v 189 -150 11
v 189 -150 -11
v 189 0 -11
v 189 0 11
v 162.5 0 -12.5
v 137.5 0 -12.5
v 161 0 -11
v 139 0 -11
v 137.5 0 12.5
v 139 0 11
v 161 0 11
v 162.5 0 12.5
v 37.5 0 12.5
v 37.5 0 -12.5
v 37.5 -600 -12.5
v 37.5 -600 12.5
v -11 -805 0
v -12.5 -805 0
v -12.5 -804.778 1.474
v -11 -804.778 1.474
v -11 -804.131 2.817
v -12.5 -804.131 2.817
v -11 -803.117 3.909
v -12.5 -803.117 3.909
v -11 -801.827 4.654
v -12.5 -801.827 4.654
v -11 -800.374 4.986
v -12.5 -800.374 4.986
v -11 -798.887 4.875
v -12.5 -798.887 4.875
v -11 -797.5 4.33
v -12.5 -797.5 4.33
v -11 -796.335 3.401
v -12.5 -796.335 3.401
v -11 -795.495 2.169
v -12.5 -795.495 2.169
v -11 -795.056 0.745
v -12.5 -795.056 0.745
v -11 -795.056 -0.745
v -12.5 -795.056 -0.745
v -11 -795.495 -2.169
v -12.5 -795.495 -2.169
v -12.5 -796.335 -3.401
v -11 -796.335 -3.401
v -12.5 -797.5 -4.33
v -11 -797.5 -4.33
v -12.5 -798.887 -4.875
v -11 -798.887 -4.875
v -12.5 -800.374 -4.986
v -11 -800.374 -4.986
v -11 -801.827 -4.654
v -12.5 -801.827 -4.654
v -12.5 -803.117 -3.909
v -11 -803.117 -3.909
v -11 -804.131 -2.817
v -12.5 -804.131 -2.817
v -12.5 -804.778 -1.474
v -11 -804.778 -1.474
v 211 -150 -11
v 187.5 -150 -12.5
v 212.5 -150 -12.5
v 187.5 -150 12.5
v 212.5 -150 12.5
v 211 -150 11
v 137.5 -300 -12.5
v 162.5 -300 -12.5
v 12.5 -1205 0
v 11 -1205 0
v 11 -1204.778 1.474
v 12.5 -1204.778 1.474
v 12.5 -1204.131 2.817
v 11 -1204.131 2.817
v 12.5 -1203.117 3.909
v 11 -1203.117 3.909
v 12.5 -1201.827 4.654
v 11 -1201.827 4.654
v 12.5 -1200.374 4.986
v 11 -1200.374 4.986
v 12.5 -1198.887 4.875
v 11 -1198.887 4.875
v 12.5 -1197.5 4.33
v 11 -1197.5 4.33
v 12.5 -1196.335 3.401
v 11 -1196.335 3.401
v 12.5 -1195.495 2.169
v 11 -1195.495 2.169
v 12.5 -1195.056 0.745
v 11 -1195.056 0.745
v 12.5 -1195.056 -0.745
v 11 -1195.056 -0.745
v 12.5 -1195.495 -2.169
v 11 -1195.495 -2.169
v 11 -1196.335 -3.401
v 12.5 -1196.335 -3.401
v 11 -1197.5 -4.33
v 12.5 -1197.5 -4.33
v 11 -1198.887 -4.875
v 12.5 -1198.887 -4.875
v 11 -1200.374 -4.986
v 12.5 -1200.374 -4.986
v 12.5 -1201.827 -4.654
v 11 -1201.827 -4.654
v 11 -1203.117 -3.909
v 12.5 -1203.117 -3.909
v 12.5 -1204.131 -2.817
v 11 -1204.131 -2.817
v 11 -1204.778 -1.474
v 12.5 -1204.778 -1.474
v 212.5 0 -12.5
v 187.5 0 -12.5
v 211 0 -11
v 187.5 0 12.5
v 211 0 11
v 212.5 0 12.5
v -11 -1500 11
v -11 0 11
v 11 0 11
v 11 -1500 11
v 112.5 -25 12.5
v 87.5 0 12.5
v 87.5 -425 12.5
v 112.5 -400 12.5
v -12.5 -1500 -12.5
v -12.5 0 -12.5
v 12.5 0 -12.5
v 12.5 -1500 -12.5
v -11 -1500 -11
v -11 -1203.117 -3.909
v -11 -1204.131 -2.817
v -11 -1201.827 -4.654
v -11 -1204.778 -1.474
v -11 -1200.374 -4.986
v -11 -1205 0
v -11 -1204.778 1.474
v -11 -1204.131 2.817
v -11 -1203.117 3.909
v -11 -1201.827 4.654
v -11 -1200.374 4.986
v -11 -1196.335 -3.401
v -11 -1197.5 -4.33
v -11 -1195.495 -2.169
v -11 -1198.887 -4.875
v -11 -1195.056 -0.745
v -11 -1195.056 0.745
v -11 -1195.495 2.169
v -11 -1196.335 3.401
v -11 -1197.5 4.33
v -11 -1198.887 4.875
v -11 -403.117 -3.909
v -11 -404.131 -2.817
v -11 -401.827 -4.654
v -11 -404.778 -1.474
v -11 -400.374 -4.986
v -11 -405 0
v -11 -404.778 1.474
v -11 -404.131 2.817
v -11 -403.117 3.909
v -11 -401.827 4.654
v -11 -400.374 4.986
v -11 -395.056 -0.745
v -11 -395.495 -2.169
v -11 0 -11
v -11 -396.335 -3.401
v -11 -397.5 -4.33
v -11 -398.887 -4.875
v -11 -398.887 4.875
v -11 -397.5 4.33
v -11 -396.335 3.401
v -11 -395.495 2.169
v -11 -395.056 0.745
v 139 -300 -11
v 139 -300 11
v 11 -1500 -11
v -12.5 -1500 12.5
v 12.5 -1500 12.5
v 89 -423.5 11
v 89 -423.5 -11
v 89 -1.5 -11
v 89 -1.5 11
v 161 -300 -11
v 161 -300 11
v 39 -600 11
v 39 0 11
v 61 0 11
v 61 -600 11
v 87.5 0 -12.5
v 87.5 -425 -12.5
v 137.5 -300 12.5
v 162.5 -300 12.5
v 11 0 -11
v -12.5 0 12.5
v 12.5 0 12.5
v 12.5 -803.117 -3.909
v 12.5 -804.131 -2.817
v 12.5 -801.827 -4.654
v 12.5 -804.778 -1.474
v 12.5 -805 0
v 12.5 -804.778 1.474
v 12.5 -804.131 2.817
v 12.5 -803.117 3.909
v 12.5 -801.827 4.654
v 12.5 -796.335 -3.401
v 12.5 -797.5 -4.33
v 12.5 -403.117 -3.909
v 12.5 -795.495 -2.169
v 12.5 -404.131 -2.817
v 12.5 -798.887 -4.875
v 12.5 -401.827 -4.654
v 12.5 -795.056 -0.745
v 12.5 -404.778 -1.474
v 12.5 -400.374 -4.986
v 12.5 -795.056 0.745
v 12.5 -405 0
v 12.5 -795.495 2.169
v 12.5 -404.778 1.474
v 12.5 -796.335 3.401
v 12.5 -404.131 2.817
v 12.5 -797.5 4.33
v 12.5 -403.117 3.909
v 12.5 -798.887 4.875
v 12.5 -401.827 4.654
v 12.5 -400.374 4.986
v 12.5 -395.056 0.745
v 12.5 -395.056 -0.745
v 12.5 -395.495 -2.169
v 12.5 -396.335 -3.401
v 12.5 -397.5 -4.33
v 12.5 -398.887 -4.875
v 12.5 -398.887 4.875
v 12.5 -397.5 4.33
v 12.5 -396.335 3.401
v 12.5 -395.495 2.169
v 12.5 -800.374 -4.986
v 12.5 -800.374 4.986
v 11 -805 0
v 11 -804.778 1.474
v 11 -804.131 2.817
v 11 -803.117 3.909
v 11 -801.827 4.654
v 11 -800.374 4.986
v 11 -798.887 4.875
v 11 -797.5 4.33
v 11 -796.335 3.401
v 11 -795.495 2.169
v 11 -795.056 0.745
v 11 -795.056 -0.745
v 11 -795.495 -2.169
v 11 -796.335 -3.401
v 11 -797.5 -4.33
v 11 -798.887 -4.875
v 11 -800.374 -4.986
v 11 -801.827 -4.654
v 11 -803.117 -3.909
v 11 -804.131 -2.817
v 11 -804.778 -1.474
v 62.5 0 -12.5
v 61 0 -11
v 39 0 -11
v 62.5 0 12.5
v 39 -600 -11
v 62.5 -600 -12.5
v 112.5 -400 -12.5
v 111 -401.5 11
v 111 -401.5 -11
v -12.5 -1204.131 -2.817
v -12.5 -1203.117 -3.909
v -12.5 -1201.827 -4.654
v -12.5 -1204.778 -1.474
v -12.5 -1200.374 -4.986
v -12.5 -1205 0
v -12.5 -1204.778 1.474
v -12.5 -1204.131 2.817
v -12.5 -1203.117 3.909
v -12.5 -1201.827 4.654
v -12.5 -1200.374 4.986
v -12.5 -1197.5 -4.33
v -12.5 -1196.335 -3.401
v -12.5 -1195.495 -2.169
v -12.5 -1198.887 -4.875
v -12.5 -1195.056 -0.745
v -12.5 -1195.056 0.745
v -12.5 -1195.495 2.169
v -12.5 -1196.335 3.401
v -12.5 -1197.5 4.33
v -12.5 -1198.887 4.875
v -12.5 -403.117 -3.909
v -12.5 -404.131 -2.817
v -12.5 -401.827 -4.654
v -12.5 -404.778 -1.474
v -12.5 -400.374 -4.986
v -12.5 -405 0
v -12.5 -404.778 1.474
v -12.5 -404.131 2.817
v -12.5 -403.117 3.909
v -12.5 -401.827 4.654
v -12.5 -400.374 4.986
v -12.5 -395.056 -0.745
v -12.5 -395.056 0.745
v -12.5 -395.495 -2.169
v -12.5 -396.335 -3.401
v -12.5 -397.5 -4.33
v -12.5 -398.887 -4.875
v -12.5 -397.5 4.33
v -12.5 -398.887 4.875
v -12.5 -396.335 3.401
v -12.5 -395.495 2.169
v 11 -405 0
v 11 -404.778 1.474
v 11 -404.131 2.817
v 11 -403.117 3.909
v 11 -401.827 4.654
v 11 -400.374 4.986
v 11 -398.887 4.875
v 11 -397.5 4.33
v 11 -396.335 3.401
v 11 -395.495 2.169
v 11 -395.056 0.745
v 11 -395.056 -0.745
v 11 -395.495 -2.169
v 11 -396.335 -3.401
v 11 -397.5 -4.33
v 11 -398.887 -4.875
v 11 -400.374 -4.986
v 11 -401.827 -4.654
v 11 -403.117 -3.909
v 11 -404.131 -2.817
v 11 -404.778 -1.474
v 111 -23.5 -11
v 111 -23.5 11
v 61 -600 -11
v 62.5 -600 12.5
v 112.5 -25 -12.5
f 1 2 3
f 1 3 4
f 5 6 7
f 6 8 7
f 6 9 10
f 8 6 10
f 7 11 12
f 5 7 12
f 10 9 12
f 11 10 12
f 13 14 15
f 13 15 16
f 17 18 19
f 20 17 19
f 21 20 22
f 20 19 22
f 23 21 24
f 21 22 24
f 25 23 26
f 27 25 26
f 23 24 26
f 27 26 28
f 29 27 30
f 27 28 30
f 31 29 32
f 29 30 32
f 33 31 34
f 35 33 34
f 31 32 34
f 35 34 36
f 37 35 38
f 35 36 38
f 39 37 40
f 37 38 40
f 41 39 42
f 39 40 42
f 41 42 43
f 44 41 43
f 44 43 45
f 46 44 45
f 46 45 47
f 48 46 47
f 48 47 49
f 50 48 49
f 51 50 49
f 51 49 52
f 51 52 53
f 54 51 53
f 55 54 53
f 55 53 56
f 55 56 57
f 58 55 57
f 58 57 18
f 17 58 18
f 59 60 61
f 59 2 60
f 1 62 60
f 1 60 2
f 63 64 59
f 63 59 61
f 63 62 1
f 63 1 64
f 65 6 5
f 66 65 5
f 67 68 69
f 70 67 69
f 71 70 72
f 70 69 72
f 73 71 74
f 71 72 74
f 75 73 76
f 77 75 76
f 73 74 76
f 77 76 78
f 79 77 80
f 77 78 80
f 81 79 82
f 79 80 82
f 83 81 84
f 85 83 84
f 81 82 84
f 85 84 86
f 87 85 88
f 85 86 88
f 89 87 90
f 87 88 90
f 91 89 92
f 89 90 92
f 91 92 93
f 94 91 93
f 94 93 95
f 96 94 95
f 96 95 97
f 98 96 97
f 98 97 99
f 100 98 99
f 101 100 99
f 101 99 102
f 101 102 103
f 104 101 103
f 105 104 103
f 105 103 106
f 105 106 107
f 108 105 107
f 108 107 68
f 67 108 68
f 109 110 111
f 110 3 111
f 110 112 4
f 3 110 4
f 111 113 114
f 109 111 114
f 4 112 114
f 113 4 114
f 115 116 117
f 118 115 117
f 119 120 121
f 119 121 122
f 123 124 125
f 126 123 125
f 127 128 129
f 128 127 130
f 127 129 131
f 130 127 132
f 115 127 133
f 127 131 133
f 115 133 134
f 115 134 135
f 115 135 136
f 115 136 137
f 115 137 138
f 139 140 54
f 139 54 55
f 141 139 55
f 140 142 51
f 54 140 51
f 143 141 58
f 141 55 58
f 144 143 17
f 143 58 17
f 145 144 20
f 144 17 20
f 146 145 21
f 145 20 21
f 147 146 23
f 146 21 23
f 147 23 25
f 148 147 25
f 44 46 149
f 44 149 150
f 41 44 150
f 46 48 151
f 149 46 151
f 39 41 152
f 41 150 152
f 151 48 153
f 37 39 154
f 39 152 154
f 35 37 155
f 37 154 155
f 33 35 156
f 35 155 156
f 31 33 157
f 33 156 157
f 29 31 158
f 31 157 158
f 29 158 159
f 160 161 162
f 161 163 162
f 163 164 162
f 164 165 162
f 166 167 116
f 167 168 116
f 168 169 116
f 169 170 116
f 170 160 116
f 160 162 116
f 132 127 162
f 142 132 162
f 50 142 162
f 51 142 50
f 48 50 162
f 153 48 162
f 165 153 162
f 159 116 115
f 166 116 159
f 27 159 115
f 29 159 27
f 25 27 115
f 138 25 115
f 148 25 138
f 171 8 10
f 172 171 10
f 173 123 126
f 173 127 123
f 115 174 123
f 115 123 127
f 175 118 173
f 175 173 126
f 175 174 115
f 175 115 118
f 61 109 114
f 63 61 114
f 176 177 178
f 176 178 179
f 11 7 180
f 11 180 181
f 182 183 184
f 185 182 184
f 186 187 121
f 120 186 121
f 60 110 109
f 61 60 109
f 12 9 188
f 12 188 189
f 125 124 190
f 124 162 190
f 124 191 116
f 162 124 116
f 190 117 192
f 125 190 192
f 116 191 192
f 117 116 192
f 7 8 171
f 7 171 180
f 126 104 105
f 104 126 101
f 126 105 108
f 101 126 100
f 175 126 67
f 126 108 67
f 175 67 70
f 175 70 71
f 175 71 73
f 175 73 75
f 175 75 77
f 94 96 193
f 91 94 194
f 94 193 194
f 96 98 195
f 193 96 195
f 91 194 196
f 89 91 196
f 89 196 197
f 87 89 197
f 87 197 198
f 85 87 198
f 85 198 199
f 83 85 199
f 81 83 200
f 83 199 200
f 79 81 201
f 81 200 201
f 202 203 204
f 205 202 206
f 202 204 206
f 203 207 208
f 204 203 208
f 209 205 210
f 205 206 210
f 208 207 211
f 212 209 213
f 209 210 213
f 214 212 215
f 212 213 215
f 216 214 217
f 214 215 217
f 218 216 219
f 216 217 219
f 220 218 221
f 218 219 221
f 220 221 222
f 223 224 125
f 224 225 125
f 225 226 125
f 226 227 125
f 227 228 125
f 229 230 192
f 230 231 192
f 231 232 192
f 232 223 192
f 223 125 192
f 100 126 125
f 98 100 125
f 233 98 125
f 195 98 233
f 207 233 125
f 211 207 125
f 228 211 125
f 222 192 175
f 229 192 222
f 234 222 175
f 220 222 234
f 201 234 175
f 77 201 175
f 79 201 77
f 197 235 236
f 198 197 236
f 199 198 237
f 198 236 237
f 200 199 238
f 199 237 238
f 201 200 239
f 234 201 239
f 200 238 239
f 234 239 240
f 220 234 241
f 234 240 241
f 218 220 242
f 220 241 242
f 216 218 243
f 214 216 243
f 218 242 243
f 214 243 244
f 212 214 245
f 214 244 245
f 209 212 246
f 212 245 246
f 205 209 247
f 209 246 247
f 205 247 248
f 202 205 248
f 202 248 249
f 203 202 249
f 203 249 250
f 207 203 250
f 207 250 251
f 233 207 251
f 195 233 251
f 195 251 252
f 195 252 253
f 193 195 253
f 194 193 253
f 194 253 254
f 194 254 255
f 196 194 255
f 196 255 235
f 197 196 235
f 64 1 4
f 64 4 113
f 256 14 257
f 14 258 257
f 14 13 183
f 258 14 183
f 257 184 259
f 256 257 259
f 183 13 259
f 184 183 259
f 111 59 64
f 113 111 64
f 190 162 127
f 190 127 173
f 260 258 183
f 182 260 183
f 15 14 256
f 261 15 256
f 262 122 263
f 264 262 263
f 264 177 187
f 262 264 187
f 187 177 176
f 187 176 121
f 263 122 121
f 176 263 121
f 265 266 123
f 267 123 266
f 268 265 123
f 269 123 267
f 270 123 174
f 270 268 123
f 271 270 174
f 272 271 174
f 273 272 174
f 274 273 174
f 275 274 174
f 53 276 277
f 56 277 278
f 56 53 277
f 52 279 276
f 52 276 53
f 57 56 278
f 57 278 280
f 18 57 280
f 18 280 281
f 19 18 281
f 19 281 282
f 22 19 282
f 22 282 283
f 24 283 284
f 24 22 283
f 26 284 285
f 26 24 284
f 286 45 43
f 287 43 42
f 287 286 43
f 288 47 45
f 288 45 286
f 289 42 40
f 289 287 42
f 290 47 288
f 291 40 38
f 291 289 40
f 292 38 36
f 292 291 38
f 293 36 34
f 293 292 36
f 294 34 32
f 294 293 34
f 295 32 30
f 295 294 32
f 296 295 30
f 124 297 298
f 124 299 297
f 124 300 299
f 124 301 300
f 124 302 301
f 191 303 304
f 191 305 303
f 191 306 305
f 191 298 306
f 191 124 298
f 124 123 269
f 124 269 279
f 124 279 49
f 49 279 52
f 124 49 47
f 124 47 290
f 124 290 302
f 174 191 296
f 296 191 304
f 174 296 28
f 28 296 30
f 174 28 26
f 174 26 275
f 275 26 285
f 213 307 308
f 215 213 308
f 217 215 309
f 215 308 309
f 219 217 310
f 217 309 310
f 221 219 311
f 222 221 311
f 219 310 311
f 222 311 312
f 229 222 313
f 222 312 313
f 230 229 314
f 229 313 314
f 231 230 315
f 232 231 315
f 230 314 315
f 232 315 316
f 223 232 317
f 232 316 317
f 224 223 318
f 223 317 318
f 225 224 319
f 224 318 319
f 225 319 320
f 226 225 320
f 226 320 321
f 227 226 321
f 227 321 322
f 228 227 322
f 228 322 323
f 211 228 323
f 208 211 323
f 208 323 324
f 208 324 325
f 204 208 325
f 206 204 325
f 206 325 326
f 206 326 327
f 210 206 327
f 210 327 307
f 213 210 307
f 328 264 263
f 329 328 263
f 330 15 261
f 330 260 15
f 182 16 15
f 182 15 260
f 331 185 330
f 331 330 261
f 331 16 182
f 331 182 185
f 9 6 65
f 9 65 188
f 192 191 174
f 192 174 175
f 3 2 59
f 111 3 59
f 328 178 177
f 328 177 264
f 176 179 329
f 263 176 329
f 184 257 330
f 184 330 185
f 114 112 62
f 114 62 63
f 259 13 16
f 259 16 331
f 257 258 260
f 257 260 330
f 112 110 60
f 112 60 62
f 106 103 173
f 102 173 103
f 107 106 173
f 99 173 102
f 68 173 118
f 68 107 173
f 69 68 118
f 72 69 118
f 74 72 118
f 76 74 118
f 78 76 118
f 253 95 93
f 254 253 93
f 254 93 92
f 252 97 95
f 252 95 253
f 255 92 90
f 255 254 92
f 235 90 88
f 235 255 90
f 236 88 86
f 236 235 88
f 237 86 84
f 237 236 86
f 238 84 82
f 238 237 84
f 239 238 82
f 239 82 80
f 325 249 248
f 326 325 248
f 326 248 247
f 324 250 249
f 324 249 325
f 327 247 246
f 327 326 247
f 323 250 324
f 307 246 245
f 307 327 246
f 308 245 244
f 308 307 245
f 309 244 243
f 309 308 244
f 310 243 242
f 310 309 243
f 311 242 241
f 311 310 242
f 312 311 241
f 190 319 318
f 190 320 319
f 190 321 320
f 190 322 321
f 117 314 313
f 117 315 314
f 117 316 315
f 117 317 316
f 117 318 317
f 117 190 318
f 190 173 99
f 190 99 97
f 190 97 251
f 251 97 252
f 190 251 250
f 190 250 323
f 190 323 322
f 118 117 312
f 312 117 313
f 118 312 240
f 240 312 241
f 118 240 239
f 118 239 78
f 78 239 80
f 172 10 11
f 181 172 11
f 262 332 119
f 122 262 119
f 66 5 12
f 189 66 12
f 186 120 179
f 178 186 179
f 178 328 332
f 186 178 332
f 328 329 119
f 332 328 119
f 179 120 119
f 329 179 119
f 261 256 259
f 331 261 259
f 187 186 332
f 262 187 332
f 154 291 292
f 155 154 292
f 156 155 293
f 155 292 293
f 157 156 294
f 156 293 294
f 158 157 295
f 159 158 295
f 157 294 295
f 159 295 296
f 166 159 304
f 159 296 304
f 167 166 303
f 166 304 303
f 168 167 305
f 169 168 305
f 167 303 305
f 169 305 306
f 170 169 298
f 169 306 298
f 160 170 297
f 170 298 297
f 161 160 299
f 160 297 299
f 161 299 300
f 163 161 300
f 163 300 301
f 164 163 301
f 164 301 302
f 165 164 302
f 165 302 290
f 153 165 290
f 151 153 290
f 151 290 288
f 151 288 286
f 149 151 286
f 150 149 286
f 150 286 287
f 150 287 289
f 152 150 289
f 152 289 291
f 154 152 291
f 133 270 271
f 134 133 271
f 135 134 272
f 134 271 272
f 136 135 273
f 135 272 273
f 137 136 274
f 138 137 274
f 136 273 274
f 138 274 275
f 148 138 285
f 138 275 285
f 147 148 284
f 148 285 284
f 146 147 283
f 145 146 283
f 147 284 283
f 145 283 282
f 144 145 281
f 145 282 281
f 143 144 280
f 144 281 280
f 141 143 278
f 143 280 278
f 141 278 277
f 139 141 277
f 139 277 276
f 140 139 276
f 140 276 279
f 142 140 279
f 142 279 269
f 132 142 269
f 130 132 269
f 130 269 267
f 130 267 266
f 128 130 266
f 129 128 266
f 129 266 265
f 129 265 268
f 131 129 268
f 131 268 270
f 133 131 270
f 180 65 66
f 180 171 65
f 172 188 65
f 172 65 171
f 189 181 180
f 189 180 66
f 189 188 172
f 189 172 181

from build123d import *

# Parameters (mm, degrees)
F0_W      = 25
F0_H      = 25
F0_W_2    = 22
F0_H_2    = 22
F1_DEPTH  = 1500
F2_W      = 25
F2_H      = 25
F2_W_2    = 22
F2_H_2    = 22
F3_DEPTH  = 600
F4_W      = 25
F4_H      = 25
F4_W_2    = 22
F4_H_2    = 22
F5_DEPTH  = 425
F7_DEPTH  = 25
F8_W      = 25
F8_H      = 25
F8_W_2    = 22
F8_H_2    = 22
F9_DEPTH  = 300
F10_R     = 5
F11_DEPTH = 25
F12_W     = 25
F12_H     = 25
F12_W_2   = 22
F12_H_2   = 22
F13_DEPTH = 150


with BuildPart() as f1:
    # F0 (on Front) → F1 (new body)
    with BuildSketch(Plane.XZ):
        Rectangle(F0_W, F0_H)
        Rectangle(F0_W_2, F0_H_2, mode=Mode.SUBTRACT)
    extrude(amount=F1_DEPTH)

    # F10 (on face) → F11 (cut)
    with BuildSketch(Plane(origin=(-12.5, 0, 0), x_dir=(0, -1, 0), z_dir=(-1, 0, 0))):
        with Locations((400, 0)):
            Circle(F10_R)
        with Locations((800, 0)):
            Circle(F10_R)
        with Locations((1200, 0)):
            Circle(F10_R)
    extrude(amount=-F11_DEPTH, mode=Mode.SUBTRACT)


with BuildPart() as f3:
    # F2 (on Front) → F3 (new body)
    with BuildSketch(Plane.XZ):
        with Locations((50, 0)):
            Rectangle(F2_W, F2_H)
        with Locations((50, 0)):
            Rectangle(F2_W_2, F2_H_2, mode=Mode.SUBTRACT)
    extrude(amount=F3_DEPTH)


with BuildPart() as f5:
    # F4 (on Front) → F5 (new body)
    with BuildSketch(Plane.XZ):
        with Locations((100, 0)):
            Rectangle(F4_W, F4_H)
        with Locations((100, 0)):
            Rectangle(F4_W_2, F4_H_2, mode=Mode.SUBTRACT)
    extrude(amount=F5_DEPTH)

    # F6 (on face) → F7 (cut)
    with BuildSketch(Plane.XY.offset(12.5)):
        Polygon((87.5, -425), (112.5, -425), (112.5, -400), align=None)
        Polygon((112.5, -25), (112.5, 0), (87.5, 0), align=None)
    extrude(amount=-F7_DEPTH, mode=Mode.SUBTRACT)


with BuildPart() as f9:
    # F8 (on Front) → F9 (new body)
    with BuildSketch(Plane.XZ):
        with Locations((150, 0)):
            Rectangle(F8_W, F8_H)
        with Locations((150, 0)):
            Rectangle(F8_W_2, F8_H_2, mode=Mode.SUBTRACT)
    extrude(amount=F9_DEPTH)


with BuildPart() as f13:
    # F12 (on Front) → F13 (new body)
    with BuildSketch(Plane.XZ):
        with Locations((200, 0)):
            Rectangle(F12_W, F12_H)
        with Locations((200, 0)):
            Rectangle(F12_W_2, F12_H_2, mode=Mode.SUBTRACT)
    extrude(amount=F13_DEPTH)


solid = Compound([f1.part, f3.part, f5.part, f9.part, f13.part])
